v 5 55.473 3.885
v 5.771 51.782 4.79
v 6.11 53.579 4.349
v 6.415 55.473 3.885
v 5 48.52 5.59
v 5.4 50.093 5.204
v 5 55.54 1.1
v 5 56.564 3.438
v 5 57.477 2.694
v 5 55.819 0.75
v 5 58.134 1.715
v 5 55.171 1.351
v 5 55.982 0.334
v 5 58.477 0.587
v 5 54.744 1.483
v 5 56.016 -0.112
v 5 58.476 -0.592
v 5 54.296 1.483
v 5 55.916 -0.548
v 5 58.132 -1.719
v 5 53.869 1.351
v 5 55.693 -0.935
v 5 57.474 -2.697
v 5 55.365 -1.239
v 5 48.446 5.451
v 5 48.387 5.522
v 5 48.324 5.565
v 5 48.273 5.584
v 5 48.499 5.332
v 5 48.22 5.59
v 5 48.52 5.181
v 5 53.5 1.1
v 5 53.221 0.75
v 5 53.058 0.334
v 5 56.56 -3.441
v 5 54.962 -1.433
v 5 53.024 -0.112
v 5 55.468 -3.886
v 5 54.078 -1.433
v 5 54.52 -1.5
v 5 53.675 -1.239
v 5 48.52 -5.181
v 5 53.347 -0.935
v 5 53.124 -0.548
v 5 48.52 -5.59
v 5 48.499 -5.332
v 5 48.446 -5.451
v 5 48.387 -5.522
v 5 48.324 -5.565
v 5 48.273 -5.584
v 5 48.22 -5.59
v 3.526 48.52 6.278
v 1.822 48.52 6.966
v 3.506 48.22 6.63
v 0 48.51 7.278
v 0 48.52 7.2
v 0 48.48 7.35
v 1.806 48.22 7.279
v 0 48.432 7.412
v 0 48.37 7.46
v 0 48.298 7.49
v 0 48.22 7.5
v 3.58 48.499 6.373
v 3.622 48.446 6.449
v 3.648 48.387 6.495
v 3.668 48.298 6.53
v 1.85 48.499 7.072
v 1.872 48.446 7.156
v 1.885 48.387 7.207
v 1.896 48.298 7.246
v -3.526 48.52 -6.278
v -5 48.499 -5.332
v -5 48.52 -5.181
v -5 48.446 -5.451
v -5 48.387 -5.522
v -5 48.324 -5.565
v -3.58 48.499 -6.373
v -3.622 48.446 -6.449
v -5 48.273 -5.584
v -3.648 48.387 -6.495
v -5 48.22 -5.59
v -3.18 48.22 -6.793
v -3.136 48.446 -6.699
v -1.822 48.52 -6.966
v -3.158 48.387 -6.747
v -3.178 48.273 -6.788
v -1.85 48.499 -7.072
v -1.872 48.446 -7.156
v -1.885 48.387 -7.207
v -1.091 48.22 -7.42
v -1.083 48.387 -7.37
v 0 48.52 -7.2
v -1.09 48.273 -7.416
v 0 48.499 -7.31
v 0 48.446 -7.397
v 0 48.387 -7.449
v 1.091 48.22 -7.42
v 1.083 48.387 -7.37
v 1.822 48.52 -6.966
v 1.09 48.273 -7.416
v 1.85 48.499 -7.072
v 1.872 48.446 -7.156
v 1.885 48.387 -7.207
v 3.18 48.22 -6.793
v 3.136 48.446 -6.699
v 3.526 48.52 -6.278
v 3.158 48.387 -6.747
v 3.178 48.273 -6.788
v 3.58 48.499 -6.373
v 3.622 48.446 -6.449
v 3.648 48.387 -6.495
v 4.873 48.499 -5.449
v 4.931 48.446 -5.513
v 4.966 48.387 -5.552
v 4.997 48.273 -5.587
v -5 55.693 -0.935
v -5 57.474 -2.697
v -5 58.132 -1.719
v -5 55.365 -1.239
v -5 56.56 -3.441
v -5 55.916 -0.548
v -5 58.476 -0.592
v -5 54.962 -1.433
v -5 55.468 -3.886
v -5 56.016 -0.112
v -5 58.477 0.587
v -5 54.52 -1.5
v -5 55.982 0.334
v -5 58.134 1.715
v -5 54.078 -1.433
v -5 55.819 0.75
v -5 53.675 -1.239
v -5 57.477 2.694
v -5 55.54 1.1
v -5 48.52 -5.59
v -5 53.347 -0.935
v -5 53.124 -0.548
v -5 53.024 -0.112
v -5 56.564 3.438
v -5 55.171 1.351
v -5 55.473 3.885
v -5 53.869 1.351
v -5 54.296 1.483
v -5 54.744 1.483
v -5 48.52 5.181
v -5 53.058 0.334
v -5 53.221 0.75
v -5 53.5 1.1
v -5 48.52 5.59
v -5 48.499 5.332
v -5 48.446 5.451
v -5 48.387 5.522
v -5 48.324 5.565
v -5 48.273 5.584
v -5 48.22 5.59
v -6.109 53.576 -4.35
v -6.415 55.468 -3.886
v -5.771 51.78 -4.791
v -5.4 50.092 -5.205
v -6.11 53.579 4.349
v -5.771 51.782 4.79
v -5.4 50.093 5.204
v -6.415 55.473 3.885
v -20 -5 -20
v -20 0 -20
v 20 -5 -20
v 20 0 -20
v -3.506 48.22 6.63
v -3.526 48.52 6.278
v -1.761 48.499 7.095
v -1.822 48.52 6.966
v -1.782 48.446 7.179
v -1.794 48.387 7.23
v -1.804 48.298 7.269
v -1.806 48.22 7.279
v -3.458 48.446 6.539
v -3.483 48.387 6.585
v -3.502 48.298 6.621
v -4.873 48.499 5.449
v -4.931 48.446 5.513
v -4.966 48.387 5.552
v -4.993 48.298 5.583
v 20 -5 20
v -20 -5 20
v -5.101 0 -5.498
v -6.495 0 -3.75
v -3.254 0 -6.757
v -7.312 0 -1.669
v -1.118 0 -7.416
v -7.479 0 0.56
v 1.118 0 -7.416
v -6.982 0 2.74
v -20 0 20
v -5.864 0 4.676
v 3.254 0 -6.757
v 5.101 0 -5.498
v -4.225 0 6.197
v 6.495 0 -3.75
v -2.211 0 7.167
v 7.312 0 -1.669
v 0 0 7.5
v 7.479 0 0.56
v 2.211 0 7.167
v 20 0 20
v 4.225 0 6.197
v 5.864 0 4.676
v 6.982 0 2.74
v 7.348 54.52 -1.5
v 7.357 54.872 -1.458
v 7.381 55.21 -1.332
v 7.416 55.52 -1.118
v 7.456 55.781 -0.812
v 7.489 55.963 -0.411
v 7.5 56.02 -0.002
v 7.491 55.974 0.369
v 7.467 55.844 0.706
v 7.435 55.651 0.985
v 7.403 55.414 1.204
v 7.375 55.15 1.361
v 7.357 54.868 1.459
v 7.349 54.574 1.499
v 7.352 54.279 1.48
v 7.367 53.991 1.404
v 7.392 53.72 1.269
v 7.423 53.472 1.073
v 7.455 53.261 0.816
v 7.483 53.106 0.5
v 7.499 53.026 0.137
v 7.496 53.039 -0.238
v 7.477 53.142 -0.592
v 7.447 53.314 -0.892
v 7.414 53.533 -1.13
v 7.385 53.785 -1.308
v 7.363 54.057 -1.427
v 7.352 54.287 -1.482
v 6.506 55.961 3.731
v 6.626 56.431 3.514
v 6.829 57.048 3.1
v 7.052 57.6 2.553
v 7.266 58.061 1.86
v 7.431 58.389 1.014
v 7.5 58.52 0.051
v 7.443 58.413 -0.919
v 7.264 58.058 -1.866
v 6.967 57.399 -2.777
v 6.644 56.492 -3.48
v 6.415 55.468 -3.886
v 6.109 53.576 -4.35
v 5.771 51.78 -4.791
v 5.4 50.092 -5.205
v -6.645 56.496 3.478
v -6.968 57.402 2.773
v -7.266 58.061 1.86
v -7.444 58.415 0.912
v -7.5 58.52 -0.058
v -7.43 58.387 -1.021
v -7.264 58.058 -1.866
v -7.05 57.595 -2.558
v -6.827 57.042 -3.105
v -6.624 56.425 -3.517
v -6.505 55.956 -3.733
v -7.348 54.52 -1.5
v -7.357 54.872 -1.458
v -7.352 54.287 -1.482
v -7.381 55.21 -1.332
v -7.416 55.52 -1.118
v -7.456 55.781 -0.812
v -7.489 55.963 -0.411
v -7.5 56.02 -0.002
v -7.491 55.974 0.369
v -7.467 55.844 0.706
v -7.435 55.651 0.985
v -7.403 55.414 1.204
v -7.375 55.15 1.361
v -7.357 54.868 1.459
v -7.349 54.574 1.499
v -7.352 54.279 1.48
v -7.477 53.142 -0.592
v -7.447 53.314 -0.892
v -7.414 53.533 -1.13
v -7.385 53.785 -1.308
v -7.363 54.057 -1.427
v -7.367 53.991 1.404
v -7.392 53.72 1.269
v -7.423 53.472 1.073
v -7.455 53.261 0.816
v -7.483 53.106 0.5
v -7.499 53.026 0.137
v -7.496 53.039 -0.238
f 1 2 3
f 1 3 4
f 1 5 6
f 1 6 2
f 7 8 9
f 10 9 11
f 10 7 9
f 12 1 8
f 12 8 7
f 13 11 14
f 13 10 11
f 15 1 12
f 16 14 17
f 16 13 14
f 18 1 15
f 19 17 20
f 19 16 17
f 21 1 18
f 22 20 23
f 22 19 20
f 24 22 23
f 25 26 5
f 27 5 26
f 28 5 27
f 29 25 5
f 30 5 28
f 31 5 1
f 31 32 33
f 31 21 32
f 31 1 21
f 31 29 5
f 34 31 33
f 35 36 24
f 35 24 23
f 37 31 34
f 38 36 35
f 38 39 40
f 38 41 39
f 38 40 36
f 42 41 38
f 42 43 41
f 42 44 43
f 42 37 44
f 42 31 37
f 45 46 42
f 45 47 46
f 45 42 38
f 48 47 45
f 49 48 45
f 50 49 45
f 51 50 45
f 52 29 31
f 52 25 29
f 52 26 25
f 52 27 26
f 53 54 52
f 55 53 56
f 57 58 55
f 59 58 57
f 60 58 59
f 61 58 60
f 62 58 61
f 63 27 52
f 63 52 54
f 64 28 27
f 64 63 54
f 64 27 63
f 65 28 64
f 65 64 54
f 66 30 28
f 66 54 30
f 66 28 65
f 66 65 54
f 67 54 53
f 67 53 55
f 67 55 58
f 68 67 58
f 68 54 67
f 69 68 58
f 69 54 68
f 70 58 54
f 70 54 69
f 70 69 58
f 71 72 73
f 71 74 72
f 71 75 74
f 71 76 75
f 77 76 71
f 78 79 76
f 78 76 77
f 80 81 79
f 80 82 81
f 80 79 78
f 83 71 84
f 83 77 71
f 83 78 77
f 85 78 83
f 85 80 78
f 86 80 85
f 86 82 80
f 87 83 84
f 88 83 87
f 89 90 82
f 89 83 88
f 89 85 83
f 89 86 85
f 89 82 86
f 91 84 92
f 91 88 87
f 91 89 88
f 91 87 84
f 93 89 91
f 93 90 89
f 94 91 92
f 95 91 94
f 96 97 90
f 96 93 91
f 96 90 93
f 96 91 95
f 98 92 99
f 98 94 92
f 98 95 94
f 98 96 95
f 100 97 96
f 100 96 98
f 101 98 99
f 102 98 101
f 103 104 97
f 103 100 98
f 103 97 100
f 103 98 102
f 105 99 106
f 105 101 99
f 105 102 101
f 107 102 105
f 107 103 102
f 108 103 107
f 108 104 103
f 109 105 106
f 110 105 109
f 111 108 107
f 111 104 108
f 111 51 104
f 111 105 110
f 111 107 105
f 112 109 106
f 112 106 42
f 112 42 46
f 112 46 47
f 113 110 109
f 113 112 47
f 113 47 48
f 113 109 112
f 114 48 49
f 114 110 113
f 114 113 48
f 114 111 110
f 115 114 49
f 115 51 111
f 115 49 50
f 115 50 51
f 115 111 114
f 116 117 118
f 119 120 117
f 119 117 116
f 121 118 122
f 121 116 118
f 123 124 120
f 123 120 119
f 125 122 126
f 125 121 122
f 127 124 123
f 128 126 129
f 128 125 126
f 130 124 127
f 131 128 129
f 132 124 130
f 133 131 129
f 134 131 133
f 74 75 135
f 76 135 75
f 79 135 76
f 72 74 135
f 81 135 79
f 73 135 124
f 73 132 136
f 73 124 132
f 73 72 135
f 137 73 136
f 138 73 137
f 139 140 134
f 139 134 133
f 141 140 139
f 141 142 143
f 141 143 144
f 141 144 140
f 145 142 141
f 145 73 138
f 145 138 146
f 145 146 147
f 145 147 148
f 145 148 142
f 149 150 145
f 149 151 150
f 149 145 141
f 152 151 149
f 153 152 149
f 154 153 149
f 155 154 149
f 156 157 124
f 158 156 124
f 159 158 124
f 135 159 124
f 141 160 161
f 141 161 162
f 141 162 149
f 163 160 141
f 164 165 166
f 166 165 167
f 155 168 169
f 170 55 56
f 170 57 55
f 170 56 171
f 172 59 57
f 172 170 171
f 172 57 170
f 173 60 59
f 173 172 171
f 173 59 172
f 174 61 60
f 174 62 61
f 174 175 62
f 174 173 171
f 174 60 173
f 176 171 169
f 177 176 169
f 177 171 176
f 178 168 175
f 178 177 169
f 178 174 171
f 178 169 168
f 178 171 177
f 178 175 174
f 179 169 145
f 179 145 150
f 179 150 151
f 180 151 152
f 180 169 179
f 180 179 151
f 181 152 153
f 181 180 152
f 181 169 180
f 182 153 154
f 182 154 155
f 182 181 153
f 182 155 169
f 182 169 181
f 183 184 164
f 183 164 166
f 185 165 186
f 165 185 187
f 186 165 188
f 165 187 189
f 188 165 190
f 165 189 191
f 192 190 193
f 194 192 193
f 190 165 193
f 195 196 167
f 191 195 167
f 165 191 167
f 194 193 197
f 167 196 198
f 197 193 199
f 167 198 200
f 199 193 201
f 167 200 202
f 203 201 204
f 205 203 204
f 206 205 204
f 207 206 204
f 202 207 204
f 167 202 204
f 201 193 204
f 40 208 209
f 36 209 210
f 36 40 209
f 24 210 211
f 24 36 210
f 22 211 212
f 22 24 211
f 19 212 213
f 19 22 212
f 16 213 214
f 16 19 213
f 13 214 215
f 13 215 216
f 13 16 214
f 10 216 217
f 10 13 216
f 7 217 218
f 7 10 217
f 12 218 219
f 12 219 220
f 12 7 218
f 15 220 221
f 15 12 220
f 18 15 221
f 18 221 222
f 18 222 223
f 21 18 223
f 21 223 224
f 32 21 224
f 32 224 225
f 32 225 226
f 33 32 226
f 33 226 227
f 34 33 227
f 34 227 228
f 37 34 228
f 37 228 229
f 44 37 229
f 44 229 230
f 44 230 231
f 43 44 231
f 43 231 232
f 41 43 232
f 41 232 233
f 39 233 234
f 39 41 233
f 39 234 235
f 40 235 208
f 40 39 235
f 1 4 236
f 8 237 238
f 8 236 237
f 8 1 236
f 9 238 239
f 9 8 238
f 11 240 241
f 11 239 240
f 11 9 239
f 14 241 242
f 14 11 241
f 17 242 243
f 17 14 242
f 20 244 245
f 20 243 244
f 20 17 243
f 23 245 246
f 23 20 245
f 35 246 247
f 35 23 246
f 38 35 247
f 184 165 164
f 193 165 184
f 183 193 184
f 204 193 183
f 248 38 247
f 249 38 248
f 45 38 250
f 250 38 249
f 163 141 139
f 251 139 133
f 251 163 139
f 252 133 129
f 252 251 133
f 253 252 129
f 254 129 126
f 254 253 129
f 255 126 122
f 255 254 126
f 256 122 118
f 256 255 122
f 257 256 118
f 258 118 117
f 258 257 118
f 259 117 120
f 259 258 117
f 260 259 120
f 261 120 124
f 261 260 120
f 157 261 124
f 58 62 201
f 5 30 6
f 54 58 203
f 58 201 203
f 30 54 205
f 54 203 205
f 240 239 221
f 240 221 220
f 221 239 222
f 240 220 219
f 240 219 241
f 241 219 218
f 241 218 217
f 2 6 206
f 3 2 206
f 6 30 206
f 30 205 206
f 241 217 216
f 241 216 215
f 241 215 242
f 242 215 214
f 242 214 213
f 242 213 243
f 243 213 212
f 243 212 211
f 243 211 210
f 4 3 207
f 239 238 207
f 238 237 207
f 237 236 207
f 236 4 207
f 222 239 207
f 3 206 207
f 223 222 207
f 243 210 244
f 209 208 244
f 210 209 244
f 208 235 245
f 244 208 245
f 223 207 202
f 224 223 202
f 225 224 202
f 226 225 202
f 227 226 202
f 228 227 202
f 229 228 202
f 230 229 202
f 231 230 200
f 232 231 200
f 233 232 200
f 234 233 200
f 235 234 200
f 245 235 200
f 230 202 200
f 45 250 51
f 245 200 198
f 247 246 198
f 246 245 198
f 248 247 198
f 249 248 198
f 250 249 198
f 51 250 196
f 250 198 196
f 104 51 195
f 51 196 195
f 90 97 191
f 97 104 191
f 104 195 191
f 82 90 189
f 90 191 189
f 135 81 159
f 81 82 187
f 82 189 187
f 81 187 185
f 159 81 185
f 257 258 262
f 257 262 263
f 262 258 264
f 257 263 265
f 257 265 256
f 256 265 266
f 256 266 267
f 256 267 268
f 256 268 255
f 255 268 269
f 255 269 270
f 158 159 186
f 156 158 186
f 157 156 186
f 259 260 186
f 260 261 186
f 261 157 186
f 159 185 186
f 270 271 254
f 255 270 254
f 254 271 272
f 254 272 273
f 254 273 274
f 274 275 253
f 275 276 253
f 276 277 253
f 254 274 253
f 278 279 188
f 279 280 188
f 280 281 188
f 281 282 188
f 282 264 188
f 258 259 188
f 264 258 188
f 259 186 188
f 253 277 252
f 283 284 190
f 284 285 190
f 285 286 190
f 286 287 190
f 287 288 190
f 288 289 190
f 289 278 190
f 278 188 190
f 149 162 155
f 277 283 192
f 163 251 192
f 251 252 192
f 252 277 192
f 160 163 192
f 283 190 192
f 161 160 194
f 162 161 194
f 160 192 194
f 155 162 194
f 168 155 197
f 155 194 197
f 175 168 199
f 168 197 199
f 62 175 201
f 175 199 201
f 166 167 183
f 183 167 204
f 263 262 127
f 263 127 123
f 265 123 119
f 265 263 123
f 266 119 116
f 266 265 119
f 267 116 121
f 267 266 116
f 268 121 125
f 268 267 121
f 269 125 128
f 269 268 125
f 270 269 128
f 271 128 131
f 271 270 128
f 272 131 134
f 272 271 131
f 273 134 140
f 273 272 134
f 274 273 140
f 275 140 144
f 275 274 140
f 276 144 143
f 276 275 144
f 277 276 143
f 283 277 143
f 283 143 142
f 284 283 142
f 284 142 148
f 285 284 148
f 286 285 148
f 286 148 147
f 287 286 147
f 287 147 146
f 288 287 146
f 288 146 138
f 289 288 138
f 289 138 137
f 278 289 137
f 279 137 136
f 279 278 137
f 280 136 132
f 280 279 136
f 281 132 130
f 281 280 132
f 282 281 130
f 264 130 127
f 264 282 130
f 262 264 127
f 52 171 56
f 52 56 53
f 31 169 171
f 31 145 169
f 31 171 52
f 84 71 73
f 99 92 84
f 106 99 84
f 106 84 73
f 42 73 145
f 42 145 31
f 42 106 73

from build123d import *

# Parameters (mm, degrees)
CROQUIS1_R                 = 7.5
SALIENTE_EXTRUIR1_DEPTH    = 58.52
CROQUIS2_W                 = 10
CROQUIS2_H                 = 15.856290926
CORTAR_EXTRUIR1_DEPTH      = 10
CORTAR_EXTRUIR2_DEPTH      = 60.473442813
CORTAR_EXTRUIR2_DEPTH_BACK = 60.473442813
CORTAR_EXTRUIR3_DEPTH      = 60.473442936
CORTAR_EXTRUIR3_DEPTH_BACK = 60.473442936
CROQUIS4_R                 = 1.5
REDONDEO1_R                = 0.3
CROQUIS6_W                 = 40
CROQUIS6_H                 = 40
SALIENTE_EXTRUIR2_DEPTH    = 5


with BuildPart() as part:
    # Croquis1 → Saliente-Extruir1 (new body)
    with BuildSketch(Plane(origin=(0, 0, 0), x_dir=(1, 0, 0), z_dir=(0, 1, 0))):
        with Locations(Location((0, 0, 0), (0, 0, 270))):
            Circle(CROQUIS1_R)
    extrude(amount=SALIENTE_EXTRUIR1_DEPTH)

    # Croquis2 → Cortar-Extruir1 (cut)
    with BuildSketch(Plane(origin=(0, 58.52, 0), x_dir=(1, 0, 0), z_dir=(0, 1, 0))):
        Rectangle(CROQUIS2_W, CROQUIS2_H)
    extrude(amount=-CORTAR_EXTRUIR1_DEPTH, mode=Mode.SUBTRACT)

    # Croquis3 → Cortar-Extruir2 (cut, two sides: drawn at the far end of the back side and taken through both)
    with BuildSketch(Plane(origin=(0, 0, 0), x_dir=(0, 0, -1), z_dir=(1, 0, 0)).offset(-CORTAR_EXTRUIR2_DEPTH_BACK)):
        with BuildLine():
            Line((-119.071460559, 48.52), (-7.5, 48.52))
            Line((-7.5, 48.52), (-5.590169944, 48.52))
            Line((-5.590169944, 48.52), (-3.884856087, 55.472834289))
            ThreePointArc((-3.884856087, 55.472834289), (0.002300645, 58.519999338), (3.885949583, 55.468364822))
            Line((3.885949583, 55.468364822), (5.590169944, 48.52))
            Line((5.590169944, 48.52), (7.5, 48.52))
            Line((7.5, 48.52), (119.071460559, 48.52))
            Line((119.071460559, 48.52), (119.071460559, 271.662921117))
            Line((119.071460559, 271.662921117), (-119.071460559, 271.662921117))
            Line((-119.071460559, 271.662921117), (-119.071460559, 48.52))
        make_face()
    extrude(amount=CORTAR_EXTRUIR2_DEPTH + CORTAR_EXTRUIR2_DEPTH_BACK, mode=Mode.SUBTRACT)

    # Croquis4 → Cortar-Extruir3 (cut, two sides: drawn at the far end of the back side and taken through both)
    with BuildSketch(Plane(origin=(0, 0, 0), x_dir=(0, 0, -1), z_dir=(1, 0, 0)).offset(-CORTAR_EXTRUIR3_DEPTH_BACK)):
        with Locations((0, 54.52)):
            Circle(CROQUIS4_R)
    extrude(amount=CORTAR_EXTRUIR3_DEPTH + CORTAR_EXTRUIR3_DEPTH_BACK, mode=Mode.SUBTRACT)

    # Redondeo1
    # the kernel refuses this fillet: 0.3 mm, written as the material it takes off along each edge
    with BuildSketch(Plane(origin=(0, 48.52, 0), x_dir=(0.7377533967735658, 0, 0.6750703115595187), z_dir=(0.6750703115595187, 0, -0.7377533967735658))) as redondeo1_piece_1_section:
        with BuildLine():
            CenterArc((7.5 - REDONDEO1_R, REDONDEO1_R), REDONDEO1_R, 270, 90)
            Line((7.5 - REDONDEO1_R, 0), (7.5, 0))
            Line((7.5, 0), (7.5, REDONDEO1_R))
        make_face()
    redondeo1_piece_1 = revolve(axis=Axis((0, 48.52, 0), (0, -1, 0)), revolution_arc=47.540389462, mode=Mode.PRIVATE)
    redondeo1_piece_1 = split(redondeo1_piece_1, bisect_by=Plane(origin=(5, 48.469281218, 5.527384127), z_dir=(-1, 0, 0)), keep=Keep.TOP, mode=Mode.PRIVATE)
    add(redondeo1_piece_1, mode=Mode.SUBTRACT)
    with BuildSketch(Plane(origin=(0, 48.52, 0), x_dir=(-0.7377709544179419, 0, -0.675051123113827), z_dir=(-0.675051123113827, 0, 0.7377709544179419))) as redondeo1_piece_2_section:
        with BuildLine():
            CenterArc((7.5 - REDONDEO1_R, REDONDEO1_R), REDONDEO1_R, 270, 90)
            Line((7.5 - REDONDEO1_R, 0), (7.5, 0))
            Line((7.5, 0), (7.5, REDONDEO1_R))
        make_face()
    redondeo1_piece_2 = revolve(axis=Axis((0, 48.52, 0), (0, -1, 0)), revolution_arc=95.083759333, mode=Mode.PRIVATE)
    redondeo1_piece_2 = split(redondeo1_piece_2, bisect_by=Plane(origin=(-5, 48.469281136, -5.527384204), z_dir=(1, 0, 0)), keep=Keep.TOP, mode=Mode.PRIVATE)
    redondeo1_piece_2 = split(redondeo1_piece_2, bisect_by=Plane(origin=(5, 48.469281136, -5.527384204), z_dir=(-1, 0, 0)), keep=Keep.TOP, mode=Mode.PRIVATE)
    add(redondeo1_piece_2, mode=Mode.SUBTRACT)
    with BuildSketch(Plane(origin=(0, 48.52, 0), x_dir=(0, 0, 1), z_dir=(1, 0, 0))) as redondeo1_piece_3_section:
        with BuildLine():
            CenterArc((7.5 - REDONDEO1_R, REDONDEO1_R), REDONDEO1_R, 270, 90)
            Line((7.5 - REDONDEO1_R, 0), (7.5, 0))
            Line((7.5, 0), (7.5, REDONDEO1_R))
        make_face()
    redondeo1_piece_3 = revolve(axis=Axis((0, 48.52, 0), (0, -1, 0)), revolution_arc=47.540389462, mode=Mode.PRIVATE)
    redondeo1_piece_3 = split(redondeo1_piece_3, bisect_by=Plane(origin=(-5, 48.435444693, 6.94366102), z_dir=(1, 0, 0)), keep=Keep.TOP, mode=Mode.PRIVATE)
    add(redondeo1_piece_3, mode=Mode.SUBTRACT)

    # Croquis6 → Saliente-Extruir2 (add)
    with BuildSketch(Plane.XZ):
        Rectangle(CROQUIS6_W, CROQUIS6_H)
    extrude(amount=SALIENTE_EXTRUIR2_DEPTH)


solid = part.part
